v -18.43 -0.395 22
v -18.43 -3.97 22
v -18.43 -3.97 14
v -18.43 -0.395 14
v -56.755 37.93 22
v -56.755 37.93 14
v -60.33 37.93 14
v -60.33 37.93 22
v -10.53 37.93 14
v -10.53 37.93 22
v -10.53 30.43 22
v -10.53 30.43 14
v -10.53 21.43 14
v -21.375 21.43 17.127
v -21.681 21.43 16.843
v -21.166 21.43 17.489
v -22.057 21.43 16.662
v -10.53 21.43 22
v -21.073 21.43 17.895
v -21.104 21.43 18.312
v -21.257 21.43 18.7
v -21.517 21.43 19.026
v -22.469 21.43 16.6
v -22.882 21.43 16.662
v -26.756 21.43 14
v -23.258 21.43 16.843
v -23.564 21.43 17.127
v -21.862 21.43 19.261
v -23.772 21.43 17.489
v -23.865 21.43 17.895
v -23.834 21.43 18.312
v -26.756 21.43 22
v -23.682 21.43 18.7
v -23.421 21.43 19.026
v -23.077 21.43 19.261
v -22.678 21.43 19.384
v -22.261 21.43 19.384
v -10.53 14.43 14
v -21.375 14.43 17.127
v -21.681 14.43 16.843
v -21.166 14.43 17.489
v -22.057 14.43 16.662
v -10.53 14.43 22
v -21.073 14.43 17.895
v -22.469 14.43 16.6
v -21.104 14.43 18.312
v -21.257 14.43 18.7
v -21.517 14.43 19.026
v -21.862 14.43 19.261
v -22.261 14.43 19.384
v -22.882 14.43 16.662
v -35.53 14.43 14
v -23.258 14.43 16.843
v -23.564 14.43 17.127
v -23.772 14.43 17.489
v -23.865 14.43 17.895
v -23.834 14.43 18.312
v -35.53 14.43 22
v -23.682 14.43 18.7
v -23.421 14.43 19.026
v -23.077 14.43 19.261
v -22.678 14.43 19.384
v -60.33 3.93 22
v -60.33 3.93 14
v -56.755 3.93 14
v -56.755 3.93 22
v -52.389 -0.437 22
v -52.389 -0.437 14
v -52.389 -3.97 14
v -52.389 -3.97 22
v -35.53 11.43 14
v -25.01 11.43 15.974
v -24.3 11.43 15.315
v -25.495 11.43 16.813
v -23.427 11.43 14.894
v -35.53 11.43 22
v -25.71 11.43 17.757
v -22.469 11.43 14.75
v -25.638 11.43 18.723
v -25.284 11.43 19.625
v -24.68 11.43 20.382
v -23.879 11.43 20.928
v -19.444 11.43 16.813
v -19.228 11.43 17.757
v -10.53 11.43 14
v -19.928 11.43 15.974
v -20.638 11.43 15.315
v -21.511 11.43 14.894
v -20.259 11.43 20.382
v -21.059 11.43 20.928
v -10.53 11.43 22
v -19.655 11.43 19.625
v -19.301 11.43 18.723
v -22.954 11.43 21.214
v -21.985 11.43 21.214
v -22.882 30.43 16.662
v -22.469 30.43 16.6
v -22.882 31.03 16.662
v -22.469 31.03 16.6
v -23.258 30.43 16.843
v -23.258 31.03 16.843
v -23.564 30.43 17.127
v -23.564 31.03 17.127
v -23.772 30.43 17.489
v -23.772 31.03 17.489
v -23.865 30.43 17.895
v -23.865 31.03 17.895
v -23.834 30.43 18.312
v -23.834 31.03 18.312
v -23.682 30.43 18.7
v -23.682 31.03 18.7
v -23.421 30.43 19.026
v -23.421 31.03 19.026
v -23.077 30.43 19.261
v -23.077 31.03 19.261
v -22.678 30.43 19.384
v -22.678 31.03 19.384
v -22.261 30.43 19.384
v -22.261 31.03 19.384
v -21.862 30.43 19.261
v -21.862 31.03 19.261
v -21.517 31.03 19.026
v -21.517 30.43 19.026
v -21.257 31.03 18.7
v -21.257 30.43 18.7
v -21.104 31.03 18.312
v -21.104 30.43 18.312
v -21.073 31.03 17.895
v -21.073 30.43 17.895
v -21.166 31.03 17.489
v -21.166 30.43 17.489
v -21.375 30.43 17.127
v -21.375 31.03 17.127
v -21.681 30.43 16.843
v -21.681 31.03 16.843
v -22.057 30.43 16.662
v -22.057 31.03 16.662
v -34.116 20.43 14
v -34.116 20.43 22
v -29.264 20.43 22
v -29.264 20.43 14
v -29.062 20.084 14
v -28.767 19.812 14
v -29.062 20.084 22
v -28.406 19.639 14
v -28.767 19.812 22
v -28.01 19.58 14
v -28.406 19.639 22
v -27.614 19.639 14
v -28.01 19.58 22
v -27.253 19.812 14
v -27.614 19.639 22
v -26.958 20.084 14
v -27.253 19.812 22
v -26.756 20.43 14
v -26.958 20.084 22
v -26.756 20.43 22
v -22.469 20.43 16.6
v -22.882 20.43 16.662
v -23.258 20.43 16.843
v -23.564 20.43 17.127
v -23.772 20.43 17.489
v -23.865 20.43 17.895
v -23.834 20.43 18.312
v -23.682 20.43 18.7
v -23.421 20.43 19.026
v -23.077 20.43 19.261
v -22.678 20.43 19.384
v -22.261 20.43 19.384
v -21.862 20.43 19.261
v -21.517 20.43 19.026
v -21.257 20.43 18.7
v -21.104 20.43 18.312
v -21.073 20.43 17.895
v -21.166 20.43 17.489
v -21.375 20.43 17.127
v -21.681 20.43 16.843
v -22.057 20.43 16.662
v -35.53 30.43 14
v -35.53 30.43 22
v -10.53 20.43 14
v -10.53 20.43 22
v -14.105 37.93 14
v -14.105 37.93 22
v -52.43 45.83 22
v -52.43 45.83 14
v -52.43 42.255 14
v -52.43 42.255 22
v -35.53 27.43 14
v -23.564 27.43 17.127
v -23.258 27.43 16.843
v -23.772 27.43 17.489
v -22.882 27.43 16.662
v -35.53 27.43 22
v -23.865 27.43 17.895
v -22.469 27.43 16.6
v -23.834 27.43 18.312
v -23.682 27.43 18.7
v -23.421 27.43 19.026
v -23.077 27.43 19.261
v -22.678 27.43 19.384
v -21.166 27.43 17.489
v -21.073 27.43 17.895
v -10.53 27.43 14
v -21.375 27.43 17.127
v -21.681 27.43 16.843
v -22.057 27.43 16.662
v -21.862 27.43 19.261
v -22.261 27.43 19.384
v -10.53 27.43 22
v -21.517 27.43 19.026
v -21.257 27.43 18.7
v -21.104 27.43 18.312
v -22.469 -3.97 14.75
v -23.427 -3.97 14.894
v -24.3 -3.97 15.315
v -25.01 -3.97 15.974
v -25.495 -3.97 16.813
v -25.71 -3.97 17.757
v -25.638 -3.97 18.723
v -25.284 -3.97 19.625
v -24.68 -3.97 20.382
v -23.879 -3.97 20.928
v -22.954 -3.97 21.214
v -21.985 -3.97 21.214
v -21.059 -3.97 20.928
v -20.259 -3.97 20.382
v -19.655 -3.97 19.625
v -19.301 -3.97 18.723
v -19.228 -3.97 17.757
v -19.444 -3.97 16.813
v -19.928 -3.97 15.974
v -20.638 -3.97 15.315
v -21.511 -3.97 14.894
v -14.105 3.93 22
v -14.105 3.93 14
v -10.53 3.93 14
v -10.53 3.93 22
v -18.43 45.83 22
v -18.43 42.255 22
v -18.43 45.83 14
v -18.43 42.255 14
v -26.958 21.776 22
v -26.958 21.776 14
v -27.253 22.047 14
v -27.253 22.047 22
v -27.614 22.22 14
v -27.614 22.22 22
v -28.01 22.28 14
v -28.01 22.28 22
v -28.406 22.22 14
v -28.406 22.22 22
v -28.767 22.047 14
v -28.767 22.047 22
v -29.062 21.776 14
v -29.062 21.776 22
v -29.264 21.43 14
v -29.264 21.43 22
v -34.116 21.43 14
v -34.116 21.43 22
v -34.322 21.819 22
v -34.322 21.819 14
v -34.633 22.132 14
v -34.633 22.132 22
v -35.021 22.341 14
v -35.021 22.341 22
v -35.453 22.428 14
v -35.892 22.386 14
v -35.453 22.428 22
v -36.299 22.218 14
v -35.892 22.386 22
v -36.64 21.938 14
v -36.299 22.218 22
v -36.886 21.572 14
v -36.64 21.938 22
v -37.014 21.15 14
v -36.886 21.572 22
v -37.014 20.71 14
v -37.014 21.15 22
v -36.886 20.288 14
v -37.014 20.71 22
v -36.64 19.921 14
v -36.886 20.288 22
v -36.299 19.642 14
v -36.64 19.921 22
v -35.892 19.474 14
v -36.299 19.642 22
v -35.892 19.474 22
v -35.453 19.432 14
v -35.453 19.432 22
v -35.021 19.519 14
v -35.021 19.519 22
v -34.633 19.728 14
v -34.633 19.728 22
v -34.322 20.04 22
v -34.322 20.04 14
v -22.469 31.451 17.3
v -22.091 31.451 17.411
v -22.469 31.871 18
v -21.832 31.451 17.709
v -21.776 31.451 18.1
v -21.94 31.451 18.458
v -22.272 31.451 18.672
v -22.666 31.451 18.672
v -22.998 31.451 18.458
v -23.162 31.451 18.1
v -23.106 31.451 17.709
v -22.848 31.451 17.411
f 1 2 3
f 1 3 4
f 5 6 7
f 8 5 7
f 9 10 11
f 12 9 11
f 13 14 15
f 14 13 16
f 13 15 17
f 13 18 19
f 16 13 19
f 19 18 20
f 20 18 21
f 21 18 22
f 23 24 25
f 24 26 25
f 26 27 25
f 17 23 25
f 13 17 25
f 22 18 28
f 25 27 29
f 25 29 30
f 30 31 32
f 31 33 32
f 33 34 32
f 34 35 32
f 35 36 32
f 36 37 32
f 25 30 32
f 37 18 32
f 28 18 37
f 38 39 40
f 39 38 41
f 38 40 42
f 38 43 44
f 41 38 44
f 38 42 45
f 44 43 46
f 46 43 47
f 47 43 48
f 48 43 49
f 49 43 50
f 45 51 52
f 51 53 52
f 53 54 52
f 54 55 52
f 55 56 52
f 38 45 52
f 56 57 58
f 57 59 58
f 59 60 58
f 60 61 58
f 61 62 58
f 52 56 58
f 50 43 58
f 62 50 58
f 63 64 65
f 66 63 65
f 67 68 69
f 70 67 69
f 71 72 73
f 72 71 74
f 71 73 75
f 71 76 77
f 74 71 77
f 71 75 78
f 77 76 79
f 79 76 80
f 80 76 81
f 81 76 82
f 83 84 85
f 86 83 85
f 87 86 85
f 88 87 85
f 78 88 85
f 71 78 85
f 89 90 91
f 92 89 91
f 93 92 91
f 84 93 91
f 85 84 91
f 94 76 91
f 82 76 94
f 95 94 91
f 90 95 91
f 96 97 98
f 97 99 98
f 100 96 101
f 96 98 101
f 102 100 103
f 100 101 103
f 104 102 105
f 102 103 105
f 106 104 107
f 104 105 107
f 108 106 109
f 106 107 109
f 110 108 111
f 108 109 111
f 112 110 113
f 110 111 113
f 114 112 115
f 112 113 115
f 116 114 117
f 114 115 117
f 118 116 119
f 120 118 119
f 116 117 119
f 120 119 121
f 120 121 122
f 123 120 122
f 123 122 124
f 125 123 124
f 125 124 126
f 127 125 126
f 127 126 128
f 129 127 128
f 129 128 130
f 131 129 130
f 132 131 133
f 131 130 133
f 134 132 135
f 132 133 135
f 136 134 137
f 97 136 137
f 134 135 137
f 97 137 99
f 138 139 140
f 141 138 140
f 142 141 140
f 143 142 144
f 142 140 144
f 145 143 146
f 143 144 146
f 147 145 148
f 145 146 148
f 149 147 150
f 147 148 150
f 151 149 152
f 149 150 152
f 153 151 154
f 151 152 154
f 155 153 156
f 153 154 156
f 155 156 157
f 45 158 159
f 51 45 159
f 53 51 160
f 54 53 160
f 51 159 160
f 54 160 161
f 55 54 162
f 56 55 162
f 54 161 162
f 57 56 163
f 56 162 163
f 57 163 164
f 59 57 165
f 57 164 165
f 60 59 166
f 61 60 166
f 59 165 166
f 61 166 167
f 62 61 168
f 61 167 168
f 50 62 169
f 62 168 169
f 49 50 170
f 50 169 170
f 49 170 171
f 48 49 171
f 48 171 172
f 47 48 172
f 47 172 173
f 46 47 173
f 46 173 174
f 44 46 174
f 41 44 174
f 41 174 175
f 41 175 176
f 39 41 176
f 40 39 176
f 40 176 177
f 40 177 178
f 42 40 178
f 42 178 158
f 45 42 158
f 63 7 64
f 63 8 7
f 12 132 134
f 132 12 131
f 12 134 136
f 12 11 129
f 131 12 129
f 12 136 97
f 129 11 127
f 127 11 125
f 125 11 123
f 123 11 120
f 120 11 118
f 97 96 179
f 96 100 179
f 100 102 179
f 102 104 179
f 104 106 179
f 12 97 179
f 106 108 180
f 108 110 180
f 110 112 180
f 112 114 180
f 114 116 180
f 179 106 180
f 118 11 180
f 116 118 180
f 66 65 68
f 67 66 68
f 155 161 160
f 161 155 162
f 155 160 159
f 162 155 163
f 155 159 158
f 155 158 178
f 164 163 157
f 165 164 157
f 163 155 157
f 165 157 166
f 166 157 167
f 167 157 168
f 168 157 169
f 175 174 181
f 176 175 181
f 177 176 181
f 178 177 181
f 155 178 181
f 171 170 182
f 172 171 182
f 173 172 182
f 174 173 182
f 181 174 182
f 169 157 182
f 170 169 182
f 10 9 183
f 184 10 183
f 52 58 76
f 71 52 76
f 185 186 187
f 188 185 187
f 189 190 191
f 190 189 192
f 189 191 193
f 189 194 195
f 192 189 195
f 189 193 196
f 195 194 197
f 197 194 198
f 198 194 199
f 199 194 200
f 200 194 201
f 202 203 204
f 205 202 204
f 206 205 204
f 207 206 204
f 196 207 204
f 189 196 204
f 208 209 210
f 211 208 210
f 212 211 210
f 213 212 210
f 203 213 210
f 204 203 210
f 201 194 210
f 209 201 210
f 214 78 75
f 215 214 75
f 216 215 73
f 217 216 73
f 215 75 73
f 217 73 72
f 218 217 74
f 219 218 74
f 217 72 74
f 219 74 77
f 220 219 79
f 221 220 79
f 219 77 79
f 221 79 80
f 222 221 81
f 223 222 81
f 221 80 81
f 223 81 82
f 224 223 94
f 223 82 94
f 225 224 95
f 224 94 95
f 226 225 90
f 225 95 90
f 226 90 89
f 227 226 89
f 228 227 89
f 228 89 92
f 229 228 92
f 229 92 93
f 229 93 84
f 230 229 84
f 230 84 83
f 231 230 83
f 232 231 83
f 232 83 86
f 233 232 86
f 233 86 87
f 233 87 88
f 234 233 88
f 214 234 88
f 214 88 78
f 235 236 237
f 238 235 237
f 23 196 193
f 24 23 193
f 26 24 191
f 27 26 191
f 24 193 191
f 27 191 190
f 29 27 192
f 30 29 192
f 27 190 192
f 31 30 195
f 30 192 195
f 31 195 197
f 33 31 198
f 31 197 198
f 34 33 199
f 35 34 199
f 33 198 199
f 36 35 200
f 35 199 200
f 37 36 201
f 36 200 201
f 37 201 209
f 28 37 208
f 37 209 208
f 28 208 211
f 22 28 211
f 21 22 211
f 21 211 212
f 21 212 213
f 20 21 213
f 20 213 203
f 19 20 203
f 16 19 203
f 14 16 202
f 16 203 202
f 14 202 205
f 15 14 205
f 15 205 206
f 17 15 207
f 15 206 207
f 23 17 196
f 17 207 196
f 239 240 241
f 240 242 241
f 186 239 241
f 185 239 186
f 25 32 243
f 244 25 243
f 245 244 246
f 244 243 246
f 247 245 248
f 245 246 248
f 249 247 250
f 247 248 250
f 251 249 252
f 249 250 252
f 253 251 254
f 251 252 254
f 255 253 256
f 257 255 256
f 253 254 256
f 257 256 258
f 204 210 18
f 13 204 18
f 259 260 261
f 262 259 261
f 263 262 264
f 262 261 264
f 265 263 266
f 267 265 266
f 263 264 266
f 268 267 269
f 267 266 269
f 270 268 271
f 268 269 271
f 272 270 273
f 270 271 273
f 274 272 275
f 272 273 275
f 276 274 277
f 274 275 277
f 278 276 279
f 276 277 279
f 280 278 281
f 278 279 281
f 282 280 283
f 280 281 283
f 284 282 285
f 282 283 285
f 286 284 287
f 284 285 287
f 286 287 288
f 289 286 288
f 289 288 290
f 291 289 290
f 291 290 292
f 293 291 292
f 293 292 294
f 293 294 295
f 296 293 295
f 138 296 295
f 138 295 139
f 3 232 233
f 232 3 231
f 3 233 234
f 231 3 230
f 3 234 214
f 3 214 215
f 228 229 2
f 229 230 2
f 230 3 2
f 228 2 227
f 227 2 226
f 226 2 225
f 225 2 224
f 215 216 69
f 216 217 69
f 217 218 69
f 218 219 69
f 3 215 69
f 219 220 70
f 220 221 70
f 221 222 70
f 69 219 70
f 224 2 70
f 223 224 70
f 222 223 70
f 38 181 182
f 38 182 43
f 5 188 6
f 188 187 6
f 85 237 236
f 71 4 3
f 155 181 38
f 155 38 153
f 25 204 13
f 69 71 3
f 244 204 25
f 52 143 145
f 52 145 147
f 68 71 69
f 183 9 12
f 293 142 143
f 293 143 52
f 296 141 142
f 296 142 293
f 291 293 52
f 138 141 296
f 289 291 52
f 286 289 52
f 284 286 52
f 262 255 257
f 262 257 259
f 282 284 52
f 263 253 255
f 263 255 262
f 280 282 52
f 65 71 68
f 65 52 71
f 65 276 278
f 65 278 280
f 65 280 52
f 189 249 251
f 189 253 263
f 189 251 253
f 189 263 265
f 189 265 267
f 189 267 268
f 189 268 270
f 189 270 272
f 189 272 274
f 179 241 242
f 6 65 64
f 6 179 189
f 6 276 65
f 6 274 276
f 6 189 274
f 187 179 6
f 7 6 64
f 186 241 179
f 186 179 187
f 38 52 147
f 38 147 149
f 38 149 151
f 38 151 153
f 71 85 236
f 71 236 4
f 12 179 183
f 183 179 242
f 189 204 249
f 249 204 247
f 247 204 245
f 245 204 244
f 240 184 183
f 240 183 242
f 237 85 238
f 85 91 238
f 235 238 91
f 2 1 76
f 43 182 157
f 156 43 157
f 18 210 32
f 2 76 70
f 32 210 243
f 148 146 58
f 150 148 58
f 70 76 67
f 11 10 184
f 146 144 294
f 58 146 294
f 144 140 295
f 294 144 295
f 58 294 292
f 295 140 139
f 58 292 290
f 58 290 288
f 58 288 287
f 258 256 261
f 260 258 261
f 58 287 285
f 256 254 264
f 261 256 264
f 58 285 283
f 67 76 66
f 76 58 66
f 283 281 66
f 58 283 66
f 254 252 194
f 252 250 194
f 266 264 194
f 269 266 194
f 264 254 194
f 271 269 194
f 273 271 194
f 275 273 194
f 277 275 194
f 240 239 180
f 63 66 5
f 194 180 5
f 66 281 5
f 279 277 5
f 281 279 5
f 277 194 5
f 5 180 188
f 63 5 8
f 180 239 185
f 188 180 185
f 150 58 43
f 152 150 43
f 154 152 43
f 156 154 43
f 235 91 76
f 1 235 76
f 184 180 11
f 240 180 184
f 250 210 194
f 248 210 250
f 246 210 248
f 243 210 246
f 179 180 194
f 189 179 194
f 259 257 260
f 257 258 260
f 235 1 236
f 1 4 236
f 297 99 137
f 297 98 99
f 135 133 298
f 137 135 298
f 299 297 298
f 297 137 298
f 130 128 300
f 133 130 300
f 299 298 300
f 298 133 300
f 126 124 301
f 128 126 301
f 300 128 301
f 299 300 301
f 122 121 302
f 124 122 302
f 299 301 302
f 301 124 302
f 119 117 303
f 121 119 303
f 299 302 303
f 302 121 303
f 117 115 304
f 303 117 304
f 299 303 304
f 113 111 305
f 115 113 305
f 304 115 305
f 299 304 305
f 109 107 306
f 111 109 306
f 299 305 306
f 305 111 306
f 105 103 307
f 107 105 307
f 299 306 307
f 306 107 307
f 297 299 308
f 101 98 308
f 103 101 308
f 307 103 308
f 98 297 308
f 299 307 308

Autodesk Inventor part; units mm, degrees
ref_plane "YZ Plane" through (0, 0, 0) normal (1, 0, 0) x (0, 1, 0)
ref_plane "XZ Plane" through (0, 0, 0) normal (0, 1, 0) x (-1, 0, 0)
ref_plane "Work Plane1" through (-56.3599, 0, 22) normal (0, 0, -1) x (-1, 0, 0)
sketch "Sketch1" plane through (-56.3599, 0, 22) normal (0, 0, -1) x (-1, 0, 0)
  line L0 (-4.0299, -0.3538) -> (-2.2322, 1.4439) construction
  arc A0 (-1.4439, 2.2322) -> (-2.2322, 1.4439) centre (-0.9299, 0.9299) ccw construction
  line L1 (-1.4439, 2.2322) -> (0.3538, 4.0299) construction
  line L2 (-37.8299, 42.8299) -> (-37.8299, 37.8299) construction
  line L3 (-37.8299, 37.8299) -> (-42.9208, 37.8299) construction
  line L4 (-37.8299, 42.2137) -> (-37.8299, 45.8299) construction
  line L5 (-37.8299, 45.8299) -> (-4.0299, 45.8299) construction
  line L6 (-4.0299, 45.8299) -> (-4.0299, 42.2137) construction
  line L7 (-4.0299, 4.0299) -> (0.3538, 4.0299) projected
  circle A1 centre (-20.9299, 20.9299) radius 17.5 projected
  line L8 (-20.9299, 58.9723) -> (17.1124, 20.9299) construction
  line L9 (17.1124, 20.9299) -> (-20.9299, -17.1124) construction
  line L10 (-20.9299, -17.1124) -> (-58.9723, 20.9299) construction
  line L11 (-58.9723, 20.9299) -> (-20.9299, 58.9723) construction
  line L12 (-20.9299, 58.9723) -> (-20.9299, -17.1124) construction
  line L13 (17.1124, 20.9299) -> (-58.9723, 20.9299) construction
  line L14 (-20.9299, 58.9723) -> (32.8701, 58.9723) construction
  line L15 (-43.4299, 43.4299) -> (1.5701, 43.4299) construction
  line L16 (1.5701, 43.4299) -> (1.5701, -1.5701) construction
  line L17 (1.5701, -1.5701) -> (-43.4299, -1.5701) construction
  line L18 (-43.4299, -1.5701) -> (-43.4299, 43.4299) construction
  line L19 (-43.4299, 43.4299) -> (1.5701, -1.5701) construction
  line L20 (1.5701, 43.4299) -> (-43.4299, -1.5701) construction
  line L21 (-43.4299, 5.3876) -> (-43.4299, 36.4723)
  line L22 (-43.4299, 36.4723) -> (-36.4723, 43.4299)
  line L23 (-36.4723, 43.4299) -> (-5.3876, 43.4299)
  line L24 (-5.3876, 43.4299) -> (1.5701, 36.4723)
  line L25 (1.5701, 36.4723) -> (1.5701, 5.3876)
  line L26 (1.5701, 5.3876) -> (-5.3876, -1.5701)
  line L27 (-5.3876, -1.5701) -> (-36.4723, -1.5701)
  line L28 (-36.4723, -1.5701) -> (-43.4299, 5.3876)
  line L29 (-4.0299, 42.2137) -> (-37.8299, 42.2137) projected
  line L30 (-4.0299, -0.3538) -> (-4.0299, 4.0299) projected
  circle A2 centre (-20.9299, 20.9299) radius 1.5
  line L31 (-10.9299, 10.9299) -> (-30.9299, 10.9299) construction
  line L32 (-30.9299, 10.9299) -> (-30.9299, 30.9299) construction
  line L33 (-30.9299, 30.9299) -> (-10.9299, 30.9299) construction
  line L34 (-10.9299, 30.9299) -> (-10.9299, 10.9299) construction
  line L35 (-10.9299, 10.9299) -> (-30.9299, 30.9299) construction
  line L36 (-30.9299, 10.9299) -> (-10.9299, 30.9299) construction
  circle A3 centre (-30.9299, 30.9299) radius 1.4
  circle A4 centre (-30.9299, 10.9299) radius 1.4
  circle A5 centre (-10.9299, 10.9299) radius 1.4
  line L37 (-45.8299, 37.8299) -> (-42.0723, 37.8299) construction
  line L38 (-42.1723, 37.7299) -> (-45.8299, 37.7299)
  line L39 (-45.8299, 37.7299) -> (-45.8299, 4.1299)
  line L40 (-45.8299, 4.1299) -> (-42.1723, 4.1299)
  line L41 (-42.1723, 4.1299) -> (-42.1723, 37.7299)
  line L42 (-45.8299, 4.0299) -> (-42.0723, 4.0299) construction
  line L43 (-45.8299, 37.8299) -> (-42.0723, 37.8299) projected
  line L44 (-37.7299, 45.8299) -> (-4.1299, 45.8299)
  line L45 (-4.1299, 45.8299) -> (-4.1299, 42.1723)
  line L46 (-4.1299, 42.1723) -> (-37.7299, 42.1723)
  line L47 (-37.7299, 42.1723) -> (-37.7299, 45.8299)
  line L48 (0.4701, 37.8299) -> (0.4701, 4.0299) construction
  line L49 (0.4701, 4.0299) -> (3.9701, 4.0299) construction
  line L50 (3.9701, 37.8299) -> (3.9701, 4.0299) construction
  line L51 (0.4701, 37.8299) -> (3.9701, 37.8299) construction
  line L52 (-45.8299, -3.9701) -> (-4.0299, -3.9701) construction
  line L53 (0.3124, 37.7299) -> (3.9701, 37.7299)
  line L54 (3.9701, 37.7299) -> (3.9701, 4.1299)
  line L55 (3.9701, 4.1299) -> (0.3124, 4.1299)
  line L56 (0.3124, 4.1299) -> (0.3124, 37.7299)
  line L57 (-4.1713, -0.3538) -> (-37.7299, -0.3538)
  line L58 (-37.7299, -0.3538) -> (-37.7299, -3.9701)
  line L59 (-37.7299, -3.9701) -> (-4.1713, -3.9701)
  line L60 (-4.1713, -3.9701) -> (-4.1713, -0.3538)
  point P0 (-37.8299, 4.0299)
  dimension "d18" = 53.8
  dimension "d19" = 45
  dimension "d20" = 53.8
  dimension "d21" = 45
  dimension "d22" = 45
  dimension "d30" = 20
  dimension "d31" = 20
  dimension "d32" = 2.8
  dimension "d33" = 2.8
  dimension "d34" = 2.8
  dimension "d35" = 3
  dimension "d36" = 0.1
  dimension "d37" = 0.1
  dimension "d38" = 0.1
  dimension "d39" = 0.1
extrude "Extrusion1" add sketch "Sketch1" along normal blind 8 contours L30 L26 L57 L28 L41 L22 L46 L24 L56 L7 | L7 L26 L30 | L56 L24 L25 L26 | L26 L25 L24 L53 L54 L55 | L60 L59 L58 L57 L28 L27 L26 | L26 L27 L28 L57 | L46 L22 L29 L24 | L24 L29 L45 | L40 L39 L38 L22 L21 L28 | L28 L21 L22 L41 | L29 L22 L23 L24 | L24 L23 L22 L29 L47 L44 L45 | L47 L29 L22 | A1 | A2 | A3 | A4 | A5
sketch "Skizze4" plane through (-56.3599, 0, 14) normal (0, 0, -1) x (-1, 0, 0)
  line L0 (-37.7299, 42.1723) -> (-42.1723, 37.7299) projected
  line L1 (-42.1723, 37.7299) -> (-45.8299, 37.7299) projected
  line L2 (-45.8299, 37.7299) -> (-45.8299, 4.1299) construction
  line L3 (-45.8299, 4.1299) -> (-42.1723, 4.1299) projected
  line L4 (-42.1723, 4.1299) -> (-37.6885, -0.3538) projected
  line L5 (-37.6885, -0.3538) -> (-37.7299, -0.3538) projected
  line L6 (-37.7299, -0.3538) -> (-37.7299, -3.9701) projected
  line L7 (-37.7299, -3.9701) -> (-4.1713, -3.9701) construction
  line L8 (-4.1713, -3.9701) -> (-4.1713, -0.3538) projected
  line L9 (-4.1713, -0.3538) -> (0.3124, 4.1299) projected
  line L10 (0.3124, 4.1299) -> (3.9701, 4.1299) projected
  line L11 (3.9701, 4.1299) -> (3.9701, 37.7299) construction
  line L12 (3.9701, 37.7299) -> (0.3124, 37.7299) projected
  line L13 (0.3124, 37.7299) -> (-4.1299, 42.1723) projected
  line L14 (-4.1299, 42.1723) -> (-4.1299, 45.8299) projected
  line L15 (-4.1299, 45.8299) -> (-37.7299, 45.8299) construction
  line L16 (-37.7299, 45.8299) -> (-37.7299, 42.1723) projected
  line L17 (-37.9299, 46.0299) -> (-3.9299, 46.0299) construction
  line L18 (-3.9299, 46.0299) -> (-3.9299, 42.2551)
  line L19 (-3.9299, 42.2551) -> (0.3953, 37.9299)
  line L20 (0.3953, 37.9299) -> (4.1701, 37.9299)
  line L21 (4.1701, 37.9299) -> (4.1701, 3.9299) construction
  line L22 (4.1701, 3.9299) -> (0.3953, 3.9299)
  line L23 (0.3953, 3.9299) -> (-3.9713, -0.4367)
  line L24 (-3.9713, -0.4367) -> (-3.9713, -4.1701)
  line L25 (-3.9713, -4.1701) -> (-37.9299, -4.1701) construction
  line L26 (-37.9299, -4.1701) -> (-37.9299, -0.3953)
  line L27 (-37.9299, -0.3953) -> (-42.2551, 3.9299)
  line L28 (-42.2551, 3.9299) -> (-46.0299, 3.9299)
  line L29 (-46.0299, 3.9299) -> (-46.0299, 37.9299) construction
  line L30 (-46.0299, 37.9299) -> (-42.2551, 37.9299)
  line L31 (-42.2551, 37.9299) -> (-37.9299, 42.2551)
  line L32 (-37.9299, 42.2551) -> (-37.9299, 46.0299)
  line L33 (-45.8299, 37.7299) -> (-45.8299, 37.9299)
  line L34 (-4.1299, 45.8299) -> (-37.7299, 45.8299) projected
  line L35 (-37.7299, 45.8299) -> (-37.9299, 45.8299)
  line L36 (-4.1299, 45.8299) -> (-3.9299, 45.8299)
  line L37 (3.9701, 37.7299) -> (3.9701, 37.9299)
  line L38 (3.9701, 4.1299) -> (3.9701, 37.7299) projected
  line L39 (3.9701, 4.1299) -> (3.9701, 3.9299)
  line L40 (-4.1713, -3.9701) -> (-3.9713, -3.9701)
  line L41 (-37.7299, -3.9701) -> (-37.9299, -3.9701)
  line L42 (-45.8299, 4.1299) -> (-45.8299, 3.9299)
  point P0 (-56.3599, 0)
  dimension "d40" = 0.2
extrude "IM_offset" add sketch "Skizze4" against normal up to surface (8 mm away)
ref_plane "Arbeitsebene5" through (-35.4299, 3.9299, 22) normal (-1, 0, 0) x (0, 0, 1)
ref_plane "Arbeitsebene6" through (-18.4299, 20.9299, 22) normal (0, 1, 0) x (-1, 0, 0)
sketch "Skizze31" plane through (-56.3599, 0, 22) normal (0, 0, 1) x (1, 0, 0)
  line L0 (25.9049, 44.8899) -> (15.7949, 44.8899) projected
  spline S0 degree 3 poles (21.2744, 21.9194) (21.3357, 21.9462) (21.3936, 21.9718) (21.5033, 22.0154) (21.5491, 22.0289) (21.5827, 22.0289) (21.5892, 22.0276) (21.5935, 22.0247) knots 0.300335 0.300335 0.300335 0.300335 0.323424 0.323424 0.35266 0.35266 0.362351 0.362351 0.362351 0.362351 projected
  line L1 (21.2744, 21.9194) -> (21.2744, 26.3899) projected
  line L2 (20.4254, 21.9194) -> (20.4254, 26.3899) projected
  line L3 (21.9714, 15.3899) -> (21.1087, 15.3899) projected
  line L4 (20.5911, 15.3899) -> (19.7285, 15.3899) projected
  line L5 (20.5999, 15.3899) -> (21.0999, 15.3899) projected
  line L6 (28.5999, 22.8289) -> (28.5999, 24.3299) projected
  line L7 (28.5999, 24.3299) -> (28.0999, 24.3299) projected
  line L8 (28.0999, 24.3299) -> (28.0999, 22.8289) projected
  line L9 (28.0999, 22.8289) -> (27.7114, 24.2788) projected
  line L10 (27.7114, 24.2788) -> (27.2285, 24.1494) projected
  line L11 (27.2285, 24.1494) -> (28.0911, 20.9299) projected
  line L12 (28.0911, 20.9299) -> (27.2285, 17.7105) projected
  line L13 (27.2285, 17.7105) -> (27.7114, 17.5811) projected
  line L14 (27.7114, 17.5811) -> (28.0999, 19.031) projected
  line L15 (28.0999, 19.031) -> (28.0999, 17.5299) projected
  line L16 (28.0999, 17.5299) -> (28.5999, 17.5299) projected
  line L17 (28.5999, 17.5299) -> (28.5999, 19.031) projected
  line L18 (28.5999, 19.031) -> (28.9884, 17.5811) projected
  line L19 (28.9884, 17.5811) -> (29.4714, 17.7105) projected
  line L20 (29.4714, 17.7105) -> (28.6087, 20.9299) projected
  line L21 (28.6087, 20.9299) -> (29.4714, 24.1494) projected
  line L22 (29.4714, 24.1494) -> (28.9884, 24.2788) projected
  line L23 (28.9884, 24.2788) -> (28.5999, 22.8289) projected
  circle A0 centre (28.3499, 20.9299) radius 1.35
  line L24 (3.9713, -3.9701) -> (37.9299, -3.9701) projected
  line L25 (37.9299, -3.9701) -> (37.9299, -0.3953) projected
  line L26 (37.9299, -0.3953) -> (42.2551, 3.9299) projected
  line L27 (42.2551, 3.9299) -> (45.8299, 3.9299) projected
  line L28 (45.8299, 3.9299) -> (45.8299, 37.9299) projected
  line L29 (45.8299, 37.9299) -> (42.2551, 37.9299) projected
  line L30 (42.2551, 37.9299) -> (37.9299, 42.2551) projected
  line L31 (37.9299, 42.2551) -> (37.9299, 45.8299) projected
  line L32 (37.9299, 45.8299) -> (3.9299, 45.8299) projected
  line L33 (3.9299, 45.8299) -> (3.9299, 42.2551) projected
  line L34 (3.9299, 42.2551) -> (-0.3953, 37.9299) projected
  line L35 (-0.3953, 37.9299) -> (-3.9701, 37.9299) projected
  line L36 (-3.9701, 37.9299) -> (-3.9701, 3.9299) projected
  line L37 (-3.9701, 3.9299) -> (-0.3953, 3.9299) projected
  line L38 (-0.3953, 3.9299) -> (3.9713, -0.4367) projected
  line L39 (3.9713, -0.4367) -> (3.9713, -3.9701) projected
  line L40 (45.8299, 37.9299) -> (45.8299, 3.9299) projected
  line L41 (20.8299, 20.4299) -> (45.8299, 20.4299)
  line L42 (45.8299, 20.4299) -> (45.8299, 21.4299)
  line L43 (45.8299, 21.4299) -> (20.8299, 21.4299)
  line L44 (20.8299, 21.4299) -> (20.8299, 20.4299)
  line L45 (20.8299, 20.4299) -> (45.8299, 21.4299) construction
  line L46 (45.8299, 20.4299) -> (20.8299, 21.4299) construction
  line L47 (45.8299, 30.4299) -> (20.8299, 30.4299)
  line L48 (20.8299, 30.4299) -> (20.8299, 27.4299)
  line L49 (20.8299, 27.4299) -> (45.8299, 27.4299)
  line L50 (45.8299, 27.4299) -> (45.8299, 30.4299)
  line L51 (45.8299, 14.4299) -> (20.8299, 14.4299)
  line L52 (20.8299, 14.4299) -> (20.8299, 11.4299)
  line L53 (20.8299, 11.4299) -> (45.8299, 11.4299)
  line L54 (45.8299, 11.4299) -> (45.8299, 14.4299)
  circle A1 centre (20.8299, 20.9299) radius 1.5
  point P0 (56.3599, 0)
  point P1 (33.3299, 20.9299)
  point P2 (45.8299, 11.4299)
  point P3 (27.0959, 20.4299)
  point P4 (29.6039, 20.4299)
  point P5 (29.6039, 21.4299)
  point P6 (27.0959, 21.4299)
  point P7 (22.2441, 21.4299)
  point P8 (22.2441, 20.4299)
  point P9 (45.8299, 27.4299)
  dimension "d181" = 2.7
  dimension "d182" = 1
  dimension "d183" = 3
  dimension "d184" = 3
  dimension "d185" = 25
  dimension "d186" = 0
  dimension "d187" = 3
  dimension "d197" = 6
  dimension "d198" = 6
extrude "Extrusion26" cut sketch "Skizze31" against normal blind 10 contours A0 L43 L21 | L21 L43 L11 A0 | L43 A0 L41 L20 L21 | L21 L20 L41 L12 L11 L43 | L43 L28 L41 A0 | L11 L43 A0 | L11 L12 L41 A0 L43 | A0 L41 A1 L43 | L41 A0 L20 | L20 A0 L12 L41 | L49 L48 L47 L28 | L41 L12 A0 | A1 L41 L44 L43 | L43 L44 L41 A1 | L28 L53 L52 L51
sketch "Skizze32" plane through (-35.5299, -3.9701, 22) normal (0, -1, 0) x (1, 0, 0)
  line L0 (8.774, 0) -> (8.774, -8) projected
  line L1 (6.266, 0) -> (6.266, -8) projected
  line L2 (-16.8586, 0) -> (17.1, 0) projected
  line L3 (-16.8586, -8) -> (-16.8586, 0) projected
  line L4 (-16.8586, -8) -> (17.1, -8) projected
  line L5 (17.1, -8) -> (17.1, 0) projected
  circle A0 centre (13.0607, -4) radius 0.7419
  point P0 (35.5299, -22)
hole "Bohrung2" at (-22.4692, -3.9701, 18) direction (0, 1, 0) diameter 2.8 depth 35 tip angle 118 counterbore diameter 6.5 counterbore depth 16
properties part number "20_Cube_Insert_2D_Galvo_Fiberlaunch_v3"
